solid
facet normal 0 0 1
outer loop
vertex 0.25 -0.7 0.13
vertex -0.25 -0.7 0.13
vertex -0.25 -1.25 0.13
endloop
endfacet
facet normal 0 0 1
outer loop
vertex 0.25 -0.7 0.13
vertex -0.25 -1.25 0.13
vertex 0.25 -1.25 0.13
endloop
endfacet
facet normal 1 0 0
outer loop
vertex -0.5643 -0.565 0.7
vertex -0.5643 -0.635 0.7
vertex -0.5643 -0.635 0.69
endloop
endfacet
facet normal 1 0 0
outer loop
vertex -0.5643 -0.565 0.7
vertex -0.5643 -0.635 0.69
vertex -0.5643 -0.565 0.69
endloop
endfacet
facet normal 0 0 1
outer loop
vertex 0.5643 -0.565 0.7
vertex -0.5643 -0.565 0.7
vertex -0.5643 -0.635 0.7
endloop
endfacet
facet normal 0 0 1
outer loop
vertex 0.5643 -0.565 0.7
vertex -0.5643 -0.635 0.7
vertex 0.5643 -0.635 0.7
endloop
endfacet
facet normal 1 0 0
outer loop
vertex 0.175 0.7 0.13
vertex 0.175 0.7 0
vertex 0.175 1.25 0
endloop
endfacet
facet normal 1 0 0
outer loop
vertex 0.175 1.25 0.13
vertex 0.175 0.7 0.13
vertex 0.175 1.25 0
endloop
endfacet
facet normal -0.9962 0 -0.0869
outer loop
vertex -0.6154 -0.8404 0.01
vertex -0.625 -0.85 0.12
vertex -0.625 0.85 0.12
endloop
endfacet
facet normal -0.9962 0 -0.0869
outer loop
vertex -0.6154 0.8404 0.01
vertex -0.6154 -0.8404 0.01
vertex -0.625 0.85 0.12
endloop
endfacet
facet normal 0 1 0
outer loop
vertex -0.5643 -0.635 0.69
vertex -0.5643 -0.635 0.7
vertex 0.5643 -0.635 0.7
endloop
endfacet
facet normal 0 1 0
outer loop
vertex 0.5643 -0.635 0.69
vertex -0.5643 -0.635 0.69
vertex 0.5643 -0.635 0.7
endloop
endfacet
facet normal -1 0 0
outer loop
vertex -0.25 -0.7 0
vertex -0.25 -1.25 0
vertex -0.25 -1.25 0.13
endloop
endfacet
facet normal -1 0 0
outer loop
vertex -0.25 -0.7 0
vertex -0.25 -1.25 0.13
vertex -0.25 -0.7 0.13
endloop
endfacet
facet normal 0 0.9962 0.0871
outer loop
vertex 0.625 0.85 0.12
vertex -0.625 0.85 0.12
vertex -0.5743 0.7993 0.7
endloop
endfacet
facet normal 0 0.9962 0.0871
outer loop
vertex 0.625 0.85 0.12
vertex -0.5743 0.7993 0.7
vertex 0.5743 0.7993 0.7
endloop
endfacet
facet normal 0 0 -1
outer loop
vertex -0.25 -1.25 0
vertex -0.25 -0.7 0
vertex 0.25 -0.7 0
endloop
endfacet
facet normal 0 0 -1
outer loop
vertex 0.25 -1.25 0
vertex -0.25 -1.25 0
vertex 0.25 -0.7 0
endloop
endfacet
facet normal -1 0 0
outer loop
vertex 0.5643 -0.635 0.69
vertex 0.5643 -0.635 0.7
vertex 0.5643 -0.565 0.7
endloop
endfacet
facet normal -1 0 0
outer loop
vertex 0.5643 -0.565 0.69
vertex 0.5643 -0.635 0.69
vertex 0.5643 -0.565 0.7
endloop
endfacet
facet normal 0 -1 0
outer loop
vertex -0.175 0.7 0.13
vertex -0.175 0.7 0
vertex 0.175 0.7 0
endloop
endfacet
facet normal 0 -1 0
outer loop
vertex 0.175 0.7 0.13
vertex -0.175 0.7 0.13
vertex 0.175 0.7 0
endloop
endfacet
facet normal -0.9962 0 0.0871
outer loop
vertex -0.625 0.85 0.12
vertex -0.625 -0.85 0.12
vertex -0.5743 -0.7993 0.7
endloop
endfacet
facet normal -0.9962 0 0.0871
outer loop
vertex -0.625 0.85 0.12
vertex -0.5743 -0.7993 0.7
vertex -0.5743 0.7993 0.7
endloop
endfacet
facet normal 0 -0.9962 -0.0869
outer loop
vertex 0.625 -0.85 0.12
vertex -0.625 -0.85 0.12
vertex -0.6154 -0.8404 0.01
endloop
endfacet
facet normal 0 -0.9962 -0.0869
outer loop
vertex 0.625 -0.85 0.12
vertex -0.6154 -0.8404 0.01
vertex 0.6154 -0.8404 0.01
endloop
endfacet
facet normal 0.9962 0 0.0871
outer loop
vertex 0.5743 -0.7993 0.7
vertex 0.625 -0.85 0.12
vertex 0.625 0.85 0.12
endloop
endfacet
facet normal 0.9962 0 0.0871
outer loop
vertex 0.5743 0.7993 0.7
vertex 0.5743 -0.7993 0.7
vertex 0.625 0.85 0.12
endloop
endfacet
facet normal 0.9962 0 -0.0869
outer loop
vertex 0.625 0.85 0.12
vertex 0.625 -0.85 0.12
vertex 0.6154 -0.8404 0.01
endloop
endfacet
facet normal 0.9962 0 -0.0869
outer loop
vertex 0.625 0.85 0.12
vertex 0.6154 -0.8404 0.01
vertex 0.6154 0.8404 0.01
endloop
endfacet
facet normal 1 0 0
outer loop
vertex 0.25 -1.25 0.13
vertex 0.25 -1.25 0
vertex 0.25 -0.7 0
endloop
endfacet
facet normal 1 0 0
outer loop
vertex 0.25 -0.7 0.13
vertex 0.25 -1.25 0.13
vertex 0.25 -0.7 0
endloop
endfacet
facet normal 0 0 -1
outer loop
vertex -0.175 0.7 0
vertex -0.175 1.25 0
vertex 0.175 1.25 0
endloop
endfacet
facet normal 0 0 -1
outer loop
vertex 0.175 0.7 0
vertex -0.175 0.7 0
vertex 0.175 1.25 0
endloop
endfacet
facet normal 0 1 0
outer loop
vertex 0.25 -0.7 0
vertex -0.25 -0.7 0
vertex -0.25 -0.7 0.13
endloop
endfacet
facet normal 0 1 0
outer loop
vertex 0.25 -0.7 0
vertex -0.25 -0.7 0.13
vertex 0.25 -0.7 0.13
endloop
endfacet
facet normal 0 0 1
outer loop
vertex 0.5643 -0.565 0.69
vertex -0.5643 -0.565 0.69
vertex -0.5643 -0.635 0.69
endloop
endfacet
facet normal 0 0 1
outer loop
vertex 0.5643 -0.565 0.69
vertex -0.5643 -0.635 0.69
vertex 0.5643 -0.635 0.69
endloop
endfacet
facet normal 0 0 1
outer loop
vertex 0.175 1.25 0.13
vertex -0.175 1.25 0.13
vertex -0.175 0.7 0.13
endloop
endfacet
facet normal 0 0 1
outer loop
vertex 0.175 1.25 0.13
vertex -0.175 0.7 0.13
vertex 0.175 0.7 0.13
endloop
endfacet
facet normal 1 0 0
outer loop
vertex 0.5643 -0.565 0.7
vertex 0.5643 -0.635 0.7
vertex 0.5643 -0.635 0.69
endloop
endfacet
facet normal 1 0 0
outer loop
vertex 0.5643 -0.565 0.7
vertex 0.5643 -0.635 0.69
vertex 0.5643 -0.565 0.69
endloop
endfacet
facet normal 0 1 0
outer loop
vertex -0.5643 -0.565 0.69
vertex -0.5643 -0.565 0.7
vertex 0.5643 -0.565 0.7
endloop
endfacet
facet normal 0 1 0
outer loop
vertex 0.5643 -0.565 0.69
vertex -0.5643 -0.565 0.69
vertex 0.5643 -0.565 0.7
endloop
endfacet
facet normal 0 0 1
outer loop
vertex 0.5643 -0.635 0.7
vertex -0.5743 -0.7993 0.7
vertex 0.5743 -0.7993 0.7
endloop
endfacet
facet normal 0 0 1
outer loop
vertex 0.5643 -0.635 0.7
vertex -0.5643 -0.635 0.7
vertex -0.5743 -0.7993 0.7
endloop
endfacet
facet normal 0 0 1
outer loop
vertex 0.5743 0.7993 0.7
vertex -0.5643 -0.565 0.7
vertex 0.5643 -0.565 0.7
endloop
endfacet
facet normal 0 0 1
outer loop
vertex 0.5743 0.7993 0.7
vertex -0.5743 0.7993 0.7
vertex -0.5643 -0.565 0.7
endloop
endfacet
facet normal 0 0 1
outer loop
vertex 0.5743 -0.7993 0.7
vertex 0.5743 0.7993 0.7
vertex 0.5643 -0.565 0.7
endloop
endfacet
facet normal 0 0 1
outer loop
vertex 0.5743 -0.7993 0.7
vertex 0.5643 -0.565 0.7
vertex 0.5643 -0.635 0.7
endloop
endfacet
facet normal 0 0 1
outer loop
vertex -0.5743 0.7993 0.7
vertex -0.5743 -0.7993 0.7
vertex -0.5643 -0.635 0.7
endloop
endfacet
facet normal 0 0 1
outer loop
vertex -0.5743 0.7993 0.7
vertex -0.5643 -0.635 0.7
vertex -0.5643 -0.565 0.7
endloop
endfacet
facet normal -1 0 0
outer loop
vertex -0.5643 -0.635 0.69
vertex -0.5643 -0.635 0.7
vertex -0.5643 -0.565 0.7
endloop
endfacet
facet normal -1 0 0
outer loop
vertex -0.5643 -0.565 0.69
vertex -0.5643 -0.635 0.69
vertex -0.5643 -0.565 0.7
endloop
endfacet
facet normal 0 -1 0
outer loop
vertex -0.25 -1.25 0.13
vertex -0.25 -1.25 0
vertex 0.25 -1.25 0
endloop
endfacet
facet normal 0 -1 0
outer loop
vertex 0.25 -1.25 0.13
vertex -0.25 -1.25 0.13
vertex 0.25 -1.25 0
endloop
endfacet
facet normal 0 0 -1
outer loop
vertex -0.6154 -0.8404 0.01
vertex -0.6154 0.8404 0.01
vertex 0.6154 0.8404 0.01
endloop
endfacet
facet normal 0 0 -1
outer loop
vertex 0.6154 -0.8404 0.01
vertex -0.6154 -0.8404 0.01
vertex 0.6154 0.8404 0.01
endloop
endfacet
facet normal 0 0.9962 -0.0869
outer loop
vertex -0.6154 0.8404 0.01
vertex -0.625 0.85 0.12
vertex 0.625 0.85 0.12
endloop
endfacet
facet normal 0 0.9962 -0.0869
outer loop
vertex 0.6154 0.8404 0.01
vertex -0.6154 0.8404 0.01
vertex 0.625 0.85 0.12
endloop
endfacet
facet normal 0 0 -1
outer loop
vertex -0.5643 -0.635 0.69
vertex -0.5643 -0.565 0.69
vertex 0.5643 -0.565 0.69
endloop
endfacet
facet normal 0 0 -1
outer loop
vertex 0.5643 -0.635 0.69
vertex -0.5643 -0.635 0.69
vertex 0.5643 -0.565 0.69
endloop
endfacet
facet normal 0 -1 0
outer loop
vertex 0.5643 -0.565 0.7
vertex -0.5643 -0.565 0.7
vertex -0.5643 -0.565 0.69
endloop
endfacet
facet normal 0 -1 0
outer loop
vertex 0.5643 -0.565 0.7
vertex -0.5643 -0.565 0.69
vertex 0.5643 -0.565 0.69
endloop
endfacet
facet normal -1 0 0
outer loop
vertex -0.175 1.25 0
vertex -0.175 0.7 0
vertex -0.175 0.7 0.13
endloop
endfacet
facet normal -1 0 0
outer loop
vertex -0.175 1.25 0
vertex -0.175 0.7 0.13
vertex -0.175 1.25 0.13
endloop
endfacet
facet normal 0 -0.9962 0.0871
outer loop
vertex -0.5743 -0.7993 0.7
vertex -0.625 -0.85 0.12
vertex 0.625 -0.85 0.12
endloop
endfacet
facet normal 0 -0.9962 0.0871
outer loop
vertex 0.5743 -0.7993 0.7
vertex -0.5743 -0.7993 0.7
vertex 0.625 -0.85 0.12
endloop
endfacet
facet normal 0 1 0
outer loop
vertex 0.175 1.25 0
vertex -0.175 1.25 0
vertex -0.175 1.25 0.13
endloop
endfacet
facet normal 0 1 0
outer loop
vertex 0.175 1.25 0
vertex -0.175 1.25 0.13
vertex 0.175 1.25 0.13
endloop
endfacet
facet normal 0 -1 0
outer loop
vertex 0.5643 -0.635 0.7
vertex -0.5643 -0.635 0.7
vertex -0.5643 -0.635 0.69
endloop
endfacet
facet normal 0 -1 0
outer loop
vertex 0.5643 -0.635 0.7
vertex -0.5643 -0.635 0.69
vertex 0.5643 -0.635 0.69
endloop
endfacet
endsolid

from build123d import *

# Parameters (mm, degrees)
F0_W          = 0.5
F0_H          = 0.55
F1_DEPTH      = 0.13
F0_W_2        = 0.35
F3_W          = 1.25
F3_H          = 1.7
F4_DEPTH      = 0.58
F4_DEPTH_BACK = 0.11
F5_SIZE2      = 0.58
F5_SIZE       = 0.0507434248
F6_SIZE2      = 0.10999
F6_SIZE       = 0.009614
F7_W          = 1.1285131503
F7_H          = 0.07
F8_DEPTH      = 0.01


# Not quite as in the source:
# - a fillet or chamfer is up to 0.001 mm smaller than in the source, because OpenCascade refuses the exact size


with BuildPart() as f1:
    # F0 (on Top) → F1 (new body)
    with BuildSketch(Plane.XY):
        with Locations((0, -0.975)):
            Rectangle(F0_W, F0_H)
    extrude(amount=F1_DEPTH)


with BuildPart() as f1b:
    # F0 (on Top) → F1, piece 2 (new body)
    with BuildSketch(Plane.XY):
        with Locations((0, 0.975)):
            Rectangle(F0_W_2, F0_H)
    extrude(amount=F1_DEPTH)


with BuildPart() as f4:
    # F3 (on offset) → F4 (new body, two sides)
    with BuildSketch(Plane.XY.offset(0.12)) as f4_sk:
        Rectangle(F3_W, F3_H)
    extrude(amount=F4_DEPTH)
    extrude(f4_sk.sketch, amount=-F4_DEPTH_BACK)

    # F5
    f5_edges = [f4.edges().sort_by_distance(p)[0] for p in [
        (0, -0.85, 0.7),
        (0.625, 0, 0.7),
        (0, 0.85, 0.7),
        (-0.625, 0, 0.7),
    ]]
    f5_side = f4.faces().sort_by_distance((0, 0, 0.7))[0]
    chamfer(f5_edges, length=F5_SIZE, length2=F5_SIZE2, reference=f5_side)

    # F6 (size 0.009623753 and 0.11 in the source; OpenCascade refuses exactly that, so slightly less here)
    f6_edges = [f4.edges().sort_by_distance(p)[0] for p in [
        (0.625, 0, 0.01),
        (0, 0.85, 0.01),
        (-0.625, 0, 0.01),
        (0, -0.85, 0.01),
    ]]
    f6_side = f4.faces().sort_by_distance((0, 0, 0.01))[0]
    chamfer(f6_edges, length=F6_SIZE, length2=F6_SIZE2, reference=f6_side)


with BuildPart() as f8:
    # F7 (on face) → F8 (new body)
    with BuildSketch(Plane.XY.offset(0.7)):
        with Locations((0, -0.6)):
            Rectangle(F7_W, F7_H)
    extrude(amount=-F8_DEPTH)


with BuildPart() as f4_1:
    add(f4.part)

    # F9: cut F8
    add(f8.part, mode=Mode.SUBTRACT)


solid = Compound([f1.part, f1b.part, f8.part, f4_1.part])
